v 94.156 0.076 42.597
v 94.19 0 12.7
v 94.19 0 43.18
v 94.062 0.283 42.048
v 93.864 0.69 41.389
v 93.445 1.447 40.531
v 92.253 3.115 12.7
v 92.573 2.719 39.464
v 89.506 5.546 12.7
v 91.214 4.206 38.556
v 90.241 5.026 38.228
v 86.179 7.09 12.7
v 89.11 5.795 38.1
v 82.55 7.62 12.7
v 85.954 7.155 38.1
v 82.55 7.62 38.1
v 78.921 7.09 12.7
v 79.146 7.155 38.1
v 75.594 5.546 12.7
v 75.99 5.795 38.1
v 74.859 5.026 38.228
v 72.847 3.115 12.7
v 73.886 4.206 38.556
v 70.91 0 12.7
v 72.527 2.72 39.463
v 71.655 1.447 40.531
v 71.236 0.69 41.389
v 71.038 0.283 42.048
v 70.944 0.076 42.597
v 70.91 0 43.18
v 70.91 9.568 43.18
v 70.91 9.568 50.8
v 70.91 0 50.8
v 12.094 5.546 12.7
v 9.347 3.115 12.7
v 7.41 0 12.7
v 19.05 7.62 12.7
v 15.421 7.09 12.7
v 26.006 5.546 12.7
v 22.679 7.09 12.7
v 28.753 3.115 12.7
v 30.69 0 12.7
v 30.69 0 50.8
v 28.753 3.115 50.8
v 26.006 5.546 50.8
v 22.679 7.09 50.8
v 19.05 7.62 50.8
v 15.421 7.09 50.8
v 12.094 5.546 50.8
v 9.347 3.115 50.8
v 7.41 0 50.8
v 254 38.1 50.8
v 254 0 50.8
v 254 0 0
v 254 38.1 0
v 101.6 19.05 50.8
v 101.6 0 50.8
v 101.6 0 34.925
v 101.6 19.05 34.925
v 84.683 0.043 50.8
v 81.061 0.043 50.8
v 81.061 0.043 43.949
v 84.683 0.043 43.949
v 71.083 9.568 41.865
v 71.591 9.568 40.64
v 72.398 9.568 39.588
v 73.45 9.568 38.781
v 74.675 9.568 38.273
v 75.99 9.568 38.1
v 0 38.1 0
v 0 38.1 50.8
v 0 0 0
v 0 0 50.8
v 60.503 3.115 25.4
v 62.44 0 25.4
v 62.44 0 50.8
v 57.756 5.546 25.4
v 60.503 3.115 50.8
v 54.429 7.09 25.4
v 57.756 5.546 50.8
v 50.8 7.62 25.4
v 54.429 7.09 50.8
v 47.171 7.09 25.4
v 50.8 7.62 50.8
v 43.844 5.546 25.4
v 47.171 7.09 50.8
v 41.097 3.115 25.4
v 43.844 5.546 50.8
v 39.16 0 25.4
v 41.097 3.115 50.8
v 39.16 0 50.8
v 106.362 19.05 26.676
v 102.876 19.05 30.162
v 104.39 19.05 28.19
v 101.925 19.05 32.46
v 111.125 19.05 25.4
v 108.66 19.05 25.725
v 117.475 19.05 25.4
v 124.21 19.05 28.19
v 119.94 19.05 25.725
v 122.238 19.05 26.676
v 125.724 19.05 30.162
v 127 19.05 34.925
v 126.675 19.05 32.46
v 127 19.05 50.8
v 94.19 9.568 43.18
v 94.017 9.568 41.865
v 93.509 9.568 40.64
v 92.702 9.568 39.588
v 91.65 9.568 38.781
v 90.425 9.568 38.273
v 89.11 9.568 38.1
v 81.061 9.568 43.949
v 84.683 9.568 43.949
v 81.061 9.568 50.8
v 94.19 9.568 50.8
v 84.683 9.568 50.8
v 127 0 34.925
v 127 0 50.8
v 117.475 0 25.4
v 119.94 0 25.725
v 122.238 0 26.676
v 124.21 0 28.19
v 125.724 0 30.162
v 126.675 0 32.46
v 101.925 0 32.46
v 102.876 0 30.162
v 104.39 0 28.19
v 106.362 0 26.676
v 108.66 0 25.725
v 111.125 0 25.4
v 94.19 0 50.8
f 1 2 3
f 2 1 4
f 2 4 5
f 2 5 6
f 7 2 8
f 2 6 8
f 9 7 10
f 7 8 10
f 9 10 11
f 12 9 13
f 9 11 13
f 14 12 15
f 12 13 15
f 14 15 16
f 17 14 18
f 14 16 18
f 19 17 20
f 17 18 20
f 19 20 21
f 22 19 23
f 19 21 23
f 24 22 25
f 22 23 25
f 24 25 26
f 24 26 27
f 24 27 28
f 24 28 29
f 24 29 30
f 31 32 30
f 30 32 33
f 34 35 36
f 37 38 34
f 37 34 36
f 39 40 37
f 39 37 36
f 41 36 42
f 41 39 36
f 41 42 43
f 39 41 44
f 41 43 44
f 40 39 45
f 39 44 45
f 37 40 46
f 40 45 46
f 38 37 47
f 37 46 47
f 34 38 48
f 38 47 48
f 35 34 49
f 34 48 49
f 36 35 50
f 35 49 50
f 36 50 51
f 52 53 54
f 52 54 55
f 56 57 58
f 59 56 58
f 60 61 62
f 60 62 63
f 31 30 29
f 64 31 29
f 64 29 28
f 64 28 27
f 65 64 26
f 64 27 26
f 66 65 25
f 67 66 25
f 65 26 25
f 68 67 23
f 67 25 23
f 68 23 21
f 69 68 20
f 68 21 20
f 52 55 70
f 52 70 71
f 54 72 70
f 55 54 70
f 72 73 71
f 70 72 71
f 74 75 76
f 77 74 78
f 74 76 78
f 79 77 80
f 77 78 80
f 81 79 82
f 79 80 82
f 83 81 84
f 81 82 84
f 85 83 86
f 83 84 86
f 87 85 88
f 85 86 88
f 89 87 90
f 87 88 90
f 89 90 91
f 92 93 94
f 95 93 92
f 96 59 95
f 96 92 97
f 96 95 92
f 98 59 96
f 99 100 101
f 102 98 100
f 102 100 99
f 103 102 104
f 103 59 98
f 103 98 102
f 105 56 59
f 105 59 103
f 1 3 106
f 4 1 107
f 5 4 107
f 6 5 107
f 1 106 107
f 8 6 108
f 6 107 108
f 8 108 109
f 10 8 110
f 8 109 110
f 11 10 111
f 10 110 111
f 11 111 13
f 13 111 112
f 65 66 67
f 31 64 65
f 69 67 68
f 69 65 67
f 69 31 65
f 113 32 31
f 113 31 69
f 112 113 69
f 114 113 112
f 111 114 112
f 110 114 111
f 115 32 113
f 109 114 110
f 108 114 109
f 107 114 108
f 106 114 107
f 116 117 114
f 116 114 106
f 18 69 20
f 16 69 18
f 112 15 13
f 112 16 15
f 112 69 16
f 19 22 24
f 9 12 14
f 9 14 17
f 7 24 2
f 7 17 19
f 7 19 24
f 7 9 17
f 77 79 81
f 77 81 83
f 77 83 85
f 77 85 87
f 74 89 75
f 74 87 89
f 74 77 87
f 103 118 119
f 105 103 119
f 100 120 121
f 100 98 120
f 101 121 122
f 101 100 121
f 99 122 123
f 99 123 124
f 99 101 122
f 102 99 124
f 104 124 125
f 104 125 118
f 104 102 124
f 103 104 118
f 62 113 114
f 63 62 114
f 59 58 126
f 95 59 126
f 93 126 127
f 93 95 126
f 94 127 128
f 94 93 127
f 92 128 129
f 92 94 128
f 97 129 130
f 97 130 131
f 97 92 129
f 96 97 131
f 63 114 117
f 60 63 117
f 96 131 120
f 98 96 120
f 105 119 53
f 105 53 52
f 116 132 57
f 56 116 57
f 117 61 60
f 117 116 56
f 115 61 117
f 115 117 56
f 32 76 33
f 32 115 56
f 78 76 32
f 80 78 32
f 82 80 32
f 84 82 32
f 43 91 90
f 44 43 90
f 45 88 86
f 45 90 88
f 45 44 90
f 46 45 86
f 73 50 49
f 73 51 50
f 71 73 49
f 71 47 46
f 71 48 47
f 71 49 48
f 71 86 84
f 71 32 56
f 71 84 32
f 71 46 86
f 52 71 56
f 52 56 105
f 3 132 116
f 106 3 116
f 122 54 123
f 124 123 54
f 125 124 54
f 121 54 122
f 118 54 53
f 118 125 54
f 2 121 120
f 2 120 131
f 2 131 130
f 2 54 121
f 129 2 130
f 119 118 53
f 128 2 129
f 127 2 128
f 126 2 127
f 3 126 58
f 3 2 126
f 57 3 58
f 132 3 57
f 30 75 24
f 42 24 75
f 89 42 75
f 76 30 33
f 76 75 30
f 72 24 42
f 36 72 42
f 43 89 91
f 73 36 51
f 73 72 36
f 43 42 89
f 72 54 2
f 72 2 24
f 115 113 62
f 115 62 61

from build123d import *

# Parameters (mm, degrees)
F0_W      = 38.1
F0_H      = 50.8
F1_DEPTH  = 254
F3_DEPTH  = 38.1
F5_DEPTH  = 25.4
F7_DEPTH  = 38.1
F8_W      = 23.2794845304
F8_H      = 9.0677170083
F8_H_2    = 9.5680775121
F9_DEPTH  = 12.7
F10_R     = 5.08
F11_W     = 3.6223009229
F11_H     = 6.850992012
F12_DEPTH = 9.525
F14_DEPTH = 19.05
F15_R     = 9.525


with BuildPart() as f1:
    # F0 (on Right) → F1 (new body)
    with BuildSketch(Plane.YZ):
        with Locations((19.05, 25.4)):
            Rectangle(F0_W, F0_H)
    extrude(amount=F1_DEPTH)

    # F2 (on face) → F3 (cut)
    with BuildSketch(Plane.XY.offset(50.8)):
        with BuildLine():
            ThreePointArc((6.35, -5.08), (19.05, -17.78), (31.75, -5.08))
            ThreePointArc((31.75, -5.08), (19.05, 7.62), (6.35, -5.08))
        make_face()
    extrude(amount=-F3_DEPTH, mode=Mode.SUBTRACT)

    # F4 (on face) → F5 (cut)
    with BuildSketch(Plane.XY.offset(50.8)):
        with BuildLine():
            ThreePointArc((38.1, -5.08), (50.8, -17.78), (63.5, -5.08))
            ThreePointArc((63.5, -5.08), (50.8, 7.62), (38.1, -5.08))
        make_face()
    extrude(amount=-F5_DEPTH, mode=Mode.SUBTRACT)

    # F6 (on face) → F7 (cut)
    with BuildSketch(Plane.XY.offset(50.8)):
        with BuildLine():
            ThreePointArc((69.85, -5.08), (82.55, -17.78), (95.25, -5.08))
            ThreePointArc((95.25, -5.08), (82.55, 7.62), (69.85, -5.08))
        make_face()
    extrude(amount=-F7_DEPTH, mode=Mode.SUBTRACT)

    # F8 (on face) → F9 (cut)
    with BuildSketch(Plane.XY.offset(50.8)):
        with Locations((82.55, -4.5338585041)):
            Rectangle(F8_W, F8_H)
        with Locations((82.55, 4.784038756)):
            Rectangle(F8_W, F8_H_2)
    extrude(amount=-F9_DEPTH, mode=Mode.SUBTRACT)

    # F10
    f10_edges = [f1.edges().sort_by_distance(p)[0] for p in [
        (70.910258, 4.784039, 38.1),
        (94.189742, 4.784039, 38.1),
    ]]
    fillet(f10_edges, radius=F10_R)

    # F11 (on face) → F12 (join)
    with BuildSketch(Plane.XZ.offset(-9.5680775121)):
        with Locations((82.8721560538, 47.374503994)):
            Rectangle(F11_W, F11_H)
    extrude(amount=F12_DEPTH)

    # F13 (on face) → F14 (cut)
    with BuildSketch(Plane.XZ):
        Polygon((101.6, 50.8), (101.6, 38.1), (101.6, 25.4), (127, 25.4), (127, 50.8), align=None)
    extrude(amount=-F14_DEPTH, mode=Mode.SUBTRACT)

    # F15
    f15_edges = [f1.edges().sort_by_distance(p)[0] for p in [
        (101.6, 9.525, 25.4),
        (127, 9.525, 25.4),
    ]]
    fillet(f15_edges, radius=F15_R)


solid = f1.part
